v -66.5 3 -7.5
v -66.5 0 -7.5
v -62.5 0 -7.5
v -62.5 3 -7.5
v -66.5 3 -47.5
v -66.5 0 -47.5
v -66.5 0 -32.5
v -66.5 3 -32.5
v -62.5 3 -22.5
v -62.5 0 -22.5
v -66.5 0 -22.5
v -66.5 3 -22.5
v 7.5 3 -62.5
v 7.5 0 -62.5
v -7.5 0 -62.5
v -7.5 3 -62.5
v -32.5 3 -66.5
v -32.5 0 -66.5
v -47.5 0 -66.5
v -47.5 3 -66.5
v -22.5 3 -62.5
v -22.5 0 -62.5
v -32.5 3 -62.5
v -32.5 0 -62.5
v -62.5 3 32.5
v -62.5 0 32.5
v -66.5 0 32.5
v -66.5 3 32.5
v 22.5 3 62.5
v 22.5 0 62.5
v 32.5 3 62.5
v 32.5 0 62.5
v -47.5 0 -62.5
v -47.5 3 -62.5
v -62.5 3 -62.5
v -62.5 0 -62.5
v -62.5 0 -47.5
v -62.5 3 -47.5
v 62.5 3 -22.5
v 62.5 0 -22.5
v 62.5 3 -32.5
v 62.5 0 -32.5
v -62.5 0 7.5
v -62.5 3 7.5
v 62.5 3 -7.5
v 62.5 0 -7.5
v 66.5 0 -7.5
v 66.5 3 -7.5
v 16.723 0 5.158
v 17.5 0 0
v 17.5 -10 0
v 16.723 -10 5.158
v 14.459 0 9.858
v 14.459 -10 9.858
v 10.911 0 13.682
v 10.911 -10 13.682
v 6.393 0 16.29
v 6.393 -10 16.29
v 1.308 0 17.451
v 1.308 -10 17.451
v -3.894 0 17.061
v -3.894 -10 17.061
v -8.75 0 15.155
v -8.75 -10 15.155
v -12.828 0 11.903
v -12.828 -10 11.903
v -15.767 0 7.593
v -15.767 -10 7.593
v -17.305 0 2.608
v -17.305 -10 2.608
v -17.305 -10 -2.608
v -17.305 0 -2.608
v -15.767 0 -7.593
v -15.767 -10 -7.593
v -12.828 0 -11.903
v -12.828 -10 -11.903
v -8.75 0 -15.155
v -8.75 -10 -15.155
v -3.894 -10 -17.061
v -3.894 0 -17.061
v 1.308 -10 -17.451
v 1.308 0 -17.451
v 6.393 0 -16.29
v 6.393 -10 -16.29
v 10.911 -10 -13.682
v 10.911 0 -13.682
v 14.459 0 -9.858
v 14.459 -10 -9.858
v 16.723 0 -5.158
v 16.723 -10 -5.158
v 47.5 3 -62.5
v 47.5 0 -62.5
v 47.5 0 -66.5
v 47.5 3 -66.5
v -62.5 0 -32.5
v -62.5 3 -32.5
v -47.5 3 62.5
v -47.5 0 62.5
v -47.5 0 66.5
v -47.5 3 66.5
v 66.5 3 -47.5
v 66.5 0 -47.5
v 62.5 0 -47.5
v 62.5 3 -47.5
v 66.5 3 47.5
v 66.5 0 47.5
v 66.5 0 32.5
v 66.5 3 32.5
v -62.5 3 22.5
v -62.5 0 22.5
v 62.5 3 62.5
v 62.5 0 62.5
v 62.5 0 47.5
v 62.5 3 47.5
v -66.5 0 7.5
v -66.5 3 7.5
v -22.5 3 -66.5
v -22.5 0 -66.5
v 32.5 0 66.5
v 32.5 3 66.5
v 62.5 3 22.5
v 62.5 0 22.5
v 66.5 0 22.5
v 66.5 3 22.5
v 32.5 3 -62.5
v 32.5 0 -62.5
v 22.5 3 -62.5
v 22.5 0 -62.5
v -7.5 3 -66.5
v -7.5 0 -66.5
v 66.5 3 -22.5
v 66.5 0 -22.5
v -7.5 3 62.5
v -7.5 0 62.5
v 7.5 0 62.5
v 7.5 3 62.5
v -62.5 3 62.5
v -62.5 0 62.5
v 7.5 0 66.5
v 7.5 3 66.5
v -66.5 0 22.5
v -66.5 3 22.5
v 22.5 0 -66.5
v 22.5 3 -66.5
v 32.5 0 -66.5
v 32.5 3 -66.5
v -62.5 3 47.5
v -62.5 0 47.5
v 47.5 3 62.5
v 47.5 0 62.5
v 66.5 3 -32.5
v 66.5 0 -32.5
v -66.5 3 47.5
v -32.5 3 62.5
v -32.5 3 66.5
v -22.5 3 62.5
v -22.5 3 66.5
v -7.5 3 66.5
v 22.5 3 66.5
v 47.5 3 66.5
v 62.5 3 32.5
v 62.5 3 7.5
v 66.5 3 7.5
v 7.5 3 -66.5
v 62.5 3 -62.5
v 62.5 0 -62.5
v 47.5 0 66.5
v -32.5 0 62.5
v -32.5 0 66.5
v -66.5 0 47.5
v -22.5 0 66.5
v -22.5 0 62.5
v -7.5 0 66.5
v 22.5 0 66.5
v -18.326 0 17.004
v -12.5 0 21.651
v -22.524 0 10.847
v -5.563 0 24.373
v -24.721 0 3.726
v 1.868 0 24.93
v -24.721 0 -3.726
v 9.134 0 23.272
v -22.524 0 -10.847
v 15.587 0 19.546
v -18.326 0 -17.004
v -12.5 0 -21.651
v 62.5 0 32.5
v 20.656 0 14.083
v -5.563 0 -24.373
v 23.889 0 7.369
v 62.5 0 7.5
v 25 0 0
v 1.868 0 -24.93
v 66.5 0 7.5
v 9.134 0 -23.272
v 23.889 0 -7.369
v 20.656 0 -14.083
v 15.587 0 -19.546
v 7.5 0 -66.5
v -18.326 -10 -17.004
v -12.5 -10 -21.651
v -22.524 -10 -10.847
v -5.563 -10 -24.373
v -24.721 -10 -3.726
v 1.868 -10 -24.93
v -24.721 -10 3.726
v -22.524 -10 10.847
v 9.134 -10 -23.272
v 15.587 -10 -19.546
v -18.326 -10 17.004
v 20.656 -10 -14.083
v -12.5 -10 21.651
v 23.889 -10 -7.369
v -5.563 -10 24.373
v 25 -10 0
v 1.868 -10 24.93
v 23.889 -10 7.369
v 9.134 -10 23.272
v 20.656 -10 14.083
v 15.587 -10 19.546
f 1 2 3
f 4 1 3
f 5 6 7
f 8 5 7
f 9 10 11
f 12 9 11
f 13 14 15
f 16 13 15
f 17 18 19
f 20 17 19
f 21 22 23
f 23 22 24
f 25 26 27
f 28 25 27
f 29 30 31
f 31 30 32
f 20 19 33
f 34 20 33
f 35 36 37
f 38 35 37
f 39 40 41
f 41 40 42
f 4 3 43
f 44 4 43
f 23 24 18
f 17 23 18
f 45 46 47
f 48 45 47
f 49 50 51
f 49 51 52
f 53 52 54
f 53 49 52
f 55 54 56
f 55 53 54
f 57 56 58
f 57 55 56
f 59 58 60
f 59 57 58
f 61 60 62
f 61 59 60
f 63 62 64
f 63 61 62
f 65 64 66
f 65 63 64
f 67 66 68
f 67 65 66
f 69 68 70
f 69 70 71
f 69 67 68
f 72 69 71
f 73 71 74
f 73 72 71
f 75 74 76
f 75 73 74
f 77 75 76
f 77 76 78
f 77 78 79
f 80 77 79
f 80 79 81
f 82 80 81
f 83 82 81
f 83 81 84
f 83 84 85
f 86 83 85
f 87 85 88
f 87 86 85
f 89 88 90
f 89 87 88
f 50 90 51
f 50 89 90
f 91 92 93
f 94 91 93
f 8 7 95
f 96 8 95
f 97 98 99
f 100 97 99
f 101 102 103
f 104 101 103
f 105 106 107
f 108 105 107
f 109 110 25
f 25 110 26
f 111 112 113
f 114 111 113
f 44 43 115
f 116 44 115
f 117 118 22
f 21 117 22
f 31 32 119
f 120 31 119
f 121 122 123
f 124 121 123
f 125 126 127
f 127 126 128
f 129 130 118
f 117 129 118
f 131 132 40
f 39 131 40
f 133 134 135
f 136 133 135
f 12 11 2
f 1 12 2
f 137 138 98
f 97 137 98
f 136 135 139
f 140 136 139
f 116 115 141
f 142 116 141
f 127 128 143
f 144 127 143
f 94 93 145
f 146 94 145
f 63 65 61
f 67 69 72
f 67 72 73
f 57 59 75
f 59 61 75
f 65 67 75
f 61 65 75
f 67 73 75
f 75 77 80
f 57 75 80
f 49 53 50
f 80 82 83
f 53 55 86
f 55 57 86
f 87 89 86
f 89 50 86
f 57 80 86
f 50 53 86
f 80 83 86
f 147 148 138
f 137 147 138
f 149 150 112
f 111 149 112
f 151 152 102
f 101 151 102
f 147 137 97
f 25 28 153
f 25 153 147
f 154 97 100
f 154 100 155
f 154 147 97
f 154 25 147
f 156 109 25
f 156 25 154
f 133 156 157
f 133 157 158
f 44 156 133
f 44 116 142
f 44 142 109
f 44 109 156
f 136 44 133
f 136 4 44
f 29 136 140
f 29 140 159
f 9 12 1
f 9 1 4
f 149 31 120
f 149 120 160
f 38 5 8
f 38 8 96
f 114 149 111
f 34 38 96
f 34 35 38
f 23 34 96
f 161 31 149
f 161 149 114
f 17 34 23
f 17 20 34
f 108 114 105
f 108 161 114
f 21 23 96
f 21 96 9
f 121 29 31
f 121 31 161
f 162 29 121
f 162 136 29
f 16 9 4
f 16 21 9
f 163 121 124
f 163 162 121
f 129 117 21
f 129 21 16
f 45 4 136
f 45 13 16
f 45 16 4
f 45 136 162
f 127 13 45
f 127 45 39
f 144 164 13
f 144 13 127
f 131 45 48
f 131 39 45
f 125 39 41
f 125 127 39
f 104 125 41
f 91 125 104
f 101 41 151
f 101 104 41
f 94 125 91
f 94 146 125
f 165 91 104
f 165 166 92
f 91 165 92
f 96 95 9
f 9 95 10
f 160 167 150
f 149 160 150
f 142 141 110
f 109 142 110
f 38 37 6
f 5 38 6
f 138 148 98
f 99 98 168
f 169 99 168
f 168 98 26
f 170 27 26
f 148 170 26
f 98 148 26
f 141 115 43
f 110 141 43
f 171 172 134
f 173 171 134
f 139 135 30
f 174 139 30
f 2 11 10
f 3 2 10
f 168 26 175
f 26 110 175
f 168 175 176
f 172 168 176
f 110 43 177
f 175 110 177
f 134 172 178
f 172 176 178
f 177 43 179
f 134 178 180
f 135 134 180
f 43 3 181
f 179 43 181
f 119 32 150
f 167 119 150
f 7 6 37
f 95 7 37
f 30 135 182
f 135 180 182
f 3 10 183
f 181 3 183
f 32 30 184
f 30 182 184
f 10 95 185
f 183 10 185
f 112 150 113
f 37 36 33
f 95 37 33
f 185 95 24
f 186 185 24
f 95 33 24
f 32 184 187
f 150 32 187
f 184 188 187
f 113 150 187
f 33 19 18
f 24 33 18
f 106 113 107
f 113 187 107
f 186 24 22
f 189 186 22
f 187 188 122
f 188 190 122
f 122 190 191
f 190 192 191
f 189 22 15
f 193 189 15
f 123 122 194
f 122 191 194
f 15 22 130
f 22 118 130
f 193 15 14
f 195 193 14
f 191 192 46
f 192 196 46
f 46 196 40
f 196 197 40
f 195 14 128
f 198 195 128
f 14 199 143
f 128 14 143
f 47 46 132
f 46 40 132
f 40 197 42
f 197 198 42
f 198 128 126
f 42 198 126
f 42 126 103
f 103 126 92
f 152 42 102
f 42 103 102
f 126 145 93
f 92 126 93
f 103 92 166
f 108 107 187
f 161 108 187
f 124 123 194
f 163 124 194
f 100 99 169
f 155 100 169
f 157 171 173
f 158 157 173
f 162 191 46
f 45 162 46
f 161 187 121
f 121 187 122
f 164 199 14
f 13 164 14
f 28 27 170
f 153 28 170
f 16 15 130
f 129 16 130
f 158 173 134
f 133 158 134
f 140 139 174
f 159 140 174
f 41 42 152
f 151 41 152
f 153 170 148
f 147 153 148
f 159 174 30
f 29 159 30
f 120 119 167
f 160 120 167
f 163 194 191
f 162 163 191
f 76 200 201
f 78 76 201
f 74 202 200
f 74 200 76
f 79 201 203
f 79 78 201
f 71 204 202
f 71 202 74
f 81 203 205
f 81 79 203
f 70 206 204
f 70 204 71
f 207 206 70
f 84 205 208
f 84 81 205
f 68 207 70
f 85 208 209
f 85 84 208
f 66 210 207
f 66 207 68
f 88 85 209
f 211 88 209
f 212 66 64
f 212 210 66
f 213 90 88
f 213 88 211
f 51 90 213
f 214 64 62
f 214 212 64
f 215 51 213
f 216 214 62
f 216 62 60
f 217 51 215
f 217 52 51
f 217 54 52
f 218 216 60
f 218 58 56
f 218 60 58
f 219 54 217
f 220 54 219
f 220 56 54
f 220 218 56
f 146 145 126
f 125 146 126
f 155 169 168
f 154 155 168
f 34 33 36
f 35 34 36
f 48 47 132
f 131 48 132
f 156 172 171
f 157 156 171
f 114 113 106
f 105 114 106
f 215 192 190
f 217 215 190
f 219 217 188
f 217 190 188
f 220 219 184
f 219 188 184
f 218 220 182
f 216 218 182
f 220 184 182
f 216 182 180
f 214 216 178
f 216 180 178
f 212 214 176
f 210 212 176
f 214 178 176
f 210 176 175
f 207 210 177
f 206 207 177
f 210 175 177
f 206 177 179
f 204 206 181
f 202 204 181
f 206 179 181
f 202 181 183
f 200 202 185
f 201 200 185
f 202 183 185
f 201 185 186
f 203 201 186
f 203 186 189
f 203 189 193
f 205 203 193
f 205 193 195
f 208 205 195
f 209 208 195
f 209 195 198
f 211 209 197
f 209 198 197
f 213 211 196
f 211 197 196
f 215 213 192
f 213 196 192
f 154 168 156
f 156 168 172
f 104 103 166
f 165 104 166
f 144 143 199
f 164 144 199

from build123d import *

# Parameters (mm, degrees)
BOSS_EXTRUDE1_DEPTH = 3
SKETCH2_R           = 25
SKETCH2_R_2         = 17.5
BOSS_EXTRUDE2_DEPTH = 10


with BuildPart() as part:
    # Sketch1 → Boss-Extrude1 (new body)
    with BuildSketch(Plane(origin=(0, 0, 0), x_dir=(1, 0, 0), z_dir=(0, 1, 0))):
        Polygon((7.5, -62.5), (7.5, -66.5), (22.5, -66.5), (22.5, -62.5), (32.5, -62.5), (32.5, -66.5), (47.5, -66.5), (47.5, -62.5), (57.5, -62.5), (62.5, -62.5), (62.5, -59), (62.5, -47.5), (66.5, -47.5), (66.5, -32.5), (62.5, -32.5), (62.5, -22.5), (66.5, -22.5), (66.5, -7.5), (62.5, -7.5), (62.5, 7.5), (66.5, 7.5), (66.5, 22.5), (62.5, 22.5), (62.5, 32.5), (66.5, 32.5), (66.5, 47.5), (62.5, 47.5), (62.5, 59), (62.5, 62.5), (57.5, 62.5), (47.5, 62.5), (47.5, 66.5), (32.5, 66.5), (32.5, 62.5), (22.5, 62.5), (22.5, 66.5), (7.5, 66.5), (7.5, 62.5), (-7.5, 62.5), (-7.5, 66.5), (-22.5, 66.5), (-22.5, 62.5), (-32.5, 62.5), (-32.5, 66.5), (-47.5, 66.5), (-47.5, 62.5), (-59, 62.5), (-62.5, 62.5), (-62.5, 59), (-62.5, 47.5), (-66.5, 47.5), (-66.5, 32.5), (-62.5, 32.5), (-62.5, 22.5), (-66.5, 22.5), (-66.5, 7.5), (-62.5, 7.5), (-62.5, -7.5), (-66.5, -7.5), (-66.5, -22.5), (-62.5, -22.5), (-62.5, -32.5), (-66.5, -32.5), (-66.5, -47.5), (-62.5, -47.5), (-62.5, -59), (-62.5, -62.5), (-59, -62.5), (-47.5, -62.5), (-47.5, -66.5), (-32.5, -66.5), (-32.5, -62.5), (-22.5, -62.5), (-22.5, -66.5), (-7.5, -66.5), (-7.5, -62.5), align=None)
    extrude(amount=BOSS_EXTRUDE1_DEPTH)

    # Sketch2 → Boss-Extrude2 (add)
    with BuildSketch(Plane.XZ):
        Circle(SKETCH2_R)
        Circle(SKETCH2_R_2, mode=Mode.SUBTRACT)
    extrude(amount=BOSS_EXTRUDE2_DEPTH)


solid = part.part
